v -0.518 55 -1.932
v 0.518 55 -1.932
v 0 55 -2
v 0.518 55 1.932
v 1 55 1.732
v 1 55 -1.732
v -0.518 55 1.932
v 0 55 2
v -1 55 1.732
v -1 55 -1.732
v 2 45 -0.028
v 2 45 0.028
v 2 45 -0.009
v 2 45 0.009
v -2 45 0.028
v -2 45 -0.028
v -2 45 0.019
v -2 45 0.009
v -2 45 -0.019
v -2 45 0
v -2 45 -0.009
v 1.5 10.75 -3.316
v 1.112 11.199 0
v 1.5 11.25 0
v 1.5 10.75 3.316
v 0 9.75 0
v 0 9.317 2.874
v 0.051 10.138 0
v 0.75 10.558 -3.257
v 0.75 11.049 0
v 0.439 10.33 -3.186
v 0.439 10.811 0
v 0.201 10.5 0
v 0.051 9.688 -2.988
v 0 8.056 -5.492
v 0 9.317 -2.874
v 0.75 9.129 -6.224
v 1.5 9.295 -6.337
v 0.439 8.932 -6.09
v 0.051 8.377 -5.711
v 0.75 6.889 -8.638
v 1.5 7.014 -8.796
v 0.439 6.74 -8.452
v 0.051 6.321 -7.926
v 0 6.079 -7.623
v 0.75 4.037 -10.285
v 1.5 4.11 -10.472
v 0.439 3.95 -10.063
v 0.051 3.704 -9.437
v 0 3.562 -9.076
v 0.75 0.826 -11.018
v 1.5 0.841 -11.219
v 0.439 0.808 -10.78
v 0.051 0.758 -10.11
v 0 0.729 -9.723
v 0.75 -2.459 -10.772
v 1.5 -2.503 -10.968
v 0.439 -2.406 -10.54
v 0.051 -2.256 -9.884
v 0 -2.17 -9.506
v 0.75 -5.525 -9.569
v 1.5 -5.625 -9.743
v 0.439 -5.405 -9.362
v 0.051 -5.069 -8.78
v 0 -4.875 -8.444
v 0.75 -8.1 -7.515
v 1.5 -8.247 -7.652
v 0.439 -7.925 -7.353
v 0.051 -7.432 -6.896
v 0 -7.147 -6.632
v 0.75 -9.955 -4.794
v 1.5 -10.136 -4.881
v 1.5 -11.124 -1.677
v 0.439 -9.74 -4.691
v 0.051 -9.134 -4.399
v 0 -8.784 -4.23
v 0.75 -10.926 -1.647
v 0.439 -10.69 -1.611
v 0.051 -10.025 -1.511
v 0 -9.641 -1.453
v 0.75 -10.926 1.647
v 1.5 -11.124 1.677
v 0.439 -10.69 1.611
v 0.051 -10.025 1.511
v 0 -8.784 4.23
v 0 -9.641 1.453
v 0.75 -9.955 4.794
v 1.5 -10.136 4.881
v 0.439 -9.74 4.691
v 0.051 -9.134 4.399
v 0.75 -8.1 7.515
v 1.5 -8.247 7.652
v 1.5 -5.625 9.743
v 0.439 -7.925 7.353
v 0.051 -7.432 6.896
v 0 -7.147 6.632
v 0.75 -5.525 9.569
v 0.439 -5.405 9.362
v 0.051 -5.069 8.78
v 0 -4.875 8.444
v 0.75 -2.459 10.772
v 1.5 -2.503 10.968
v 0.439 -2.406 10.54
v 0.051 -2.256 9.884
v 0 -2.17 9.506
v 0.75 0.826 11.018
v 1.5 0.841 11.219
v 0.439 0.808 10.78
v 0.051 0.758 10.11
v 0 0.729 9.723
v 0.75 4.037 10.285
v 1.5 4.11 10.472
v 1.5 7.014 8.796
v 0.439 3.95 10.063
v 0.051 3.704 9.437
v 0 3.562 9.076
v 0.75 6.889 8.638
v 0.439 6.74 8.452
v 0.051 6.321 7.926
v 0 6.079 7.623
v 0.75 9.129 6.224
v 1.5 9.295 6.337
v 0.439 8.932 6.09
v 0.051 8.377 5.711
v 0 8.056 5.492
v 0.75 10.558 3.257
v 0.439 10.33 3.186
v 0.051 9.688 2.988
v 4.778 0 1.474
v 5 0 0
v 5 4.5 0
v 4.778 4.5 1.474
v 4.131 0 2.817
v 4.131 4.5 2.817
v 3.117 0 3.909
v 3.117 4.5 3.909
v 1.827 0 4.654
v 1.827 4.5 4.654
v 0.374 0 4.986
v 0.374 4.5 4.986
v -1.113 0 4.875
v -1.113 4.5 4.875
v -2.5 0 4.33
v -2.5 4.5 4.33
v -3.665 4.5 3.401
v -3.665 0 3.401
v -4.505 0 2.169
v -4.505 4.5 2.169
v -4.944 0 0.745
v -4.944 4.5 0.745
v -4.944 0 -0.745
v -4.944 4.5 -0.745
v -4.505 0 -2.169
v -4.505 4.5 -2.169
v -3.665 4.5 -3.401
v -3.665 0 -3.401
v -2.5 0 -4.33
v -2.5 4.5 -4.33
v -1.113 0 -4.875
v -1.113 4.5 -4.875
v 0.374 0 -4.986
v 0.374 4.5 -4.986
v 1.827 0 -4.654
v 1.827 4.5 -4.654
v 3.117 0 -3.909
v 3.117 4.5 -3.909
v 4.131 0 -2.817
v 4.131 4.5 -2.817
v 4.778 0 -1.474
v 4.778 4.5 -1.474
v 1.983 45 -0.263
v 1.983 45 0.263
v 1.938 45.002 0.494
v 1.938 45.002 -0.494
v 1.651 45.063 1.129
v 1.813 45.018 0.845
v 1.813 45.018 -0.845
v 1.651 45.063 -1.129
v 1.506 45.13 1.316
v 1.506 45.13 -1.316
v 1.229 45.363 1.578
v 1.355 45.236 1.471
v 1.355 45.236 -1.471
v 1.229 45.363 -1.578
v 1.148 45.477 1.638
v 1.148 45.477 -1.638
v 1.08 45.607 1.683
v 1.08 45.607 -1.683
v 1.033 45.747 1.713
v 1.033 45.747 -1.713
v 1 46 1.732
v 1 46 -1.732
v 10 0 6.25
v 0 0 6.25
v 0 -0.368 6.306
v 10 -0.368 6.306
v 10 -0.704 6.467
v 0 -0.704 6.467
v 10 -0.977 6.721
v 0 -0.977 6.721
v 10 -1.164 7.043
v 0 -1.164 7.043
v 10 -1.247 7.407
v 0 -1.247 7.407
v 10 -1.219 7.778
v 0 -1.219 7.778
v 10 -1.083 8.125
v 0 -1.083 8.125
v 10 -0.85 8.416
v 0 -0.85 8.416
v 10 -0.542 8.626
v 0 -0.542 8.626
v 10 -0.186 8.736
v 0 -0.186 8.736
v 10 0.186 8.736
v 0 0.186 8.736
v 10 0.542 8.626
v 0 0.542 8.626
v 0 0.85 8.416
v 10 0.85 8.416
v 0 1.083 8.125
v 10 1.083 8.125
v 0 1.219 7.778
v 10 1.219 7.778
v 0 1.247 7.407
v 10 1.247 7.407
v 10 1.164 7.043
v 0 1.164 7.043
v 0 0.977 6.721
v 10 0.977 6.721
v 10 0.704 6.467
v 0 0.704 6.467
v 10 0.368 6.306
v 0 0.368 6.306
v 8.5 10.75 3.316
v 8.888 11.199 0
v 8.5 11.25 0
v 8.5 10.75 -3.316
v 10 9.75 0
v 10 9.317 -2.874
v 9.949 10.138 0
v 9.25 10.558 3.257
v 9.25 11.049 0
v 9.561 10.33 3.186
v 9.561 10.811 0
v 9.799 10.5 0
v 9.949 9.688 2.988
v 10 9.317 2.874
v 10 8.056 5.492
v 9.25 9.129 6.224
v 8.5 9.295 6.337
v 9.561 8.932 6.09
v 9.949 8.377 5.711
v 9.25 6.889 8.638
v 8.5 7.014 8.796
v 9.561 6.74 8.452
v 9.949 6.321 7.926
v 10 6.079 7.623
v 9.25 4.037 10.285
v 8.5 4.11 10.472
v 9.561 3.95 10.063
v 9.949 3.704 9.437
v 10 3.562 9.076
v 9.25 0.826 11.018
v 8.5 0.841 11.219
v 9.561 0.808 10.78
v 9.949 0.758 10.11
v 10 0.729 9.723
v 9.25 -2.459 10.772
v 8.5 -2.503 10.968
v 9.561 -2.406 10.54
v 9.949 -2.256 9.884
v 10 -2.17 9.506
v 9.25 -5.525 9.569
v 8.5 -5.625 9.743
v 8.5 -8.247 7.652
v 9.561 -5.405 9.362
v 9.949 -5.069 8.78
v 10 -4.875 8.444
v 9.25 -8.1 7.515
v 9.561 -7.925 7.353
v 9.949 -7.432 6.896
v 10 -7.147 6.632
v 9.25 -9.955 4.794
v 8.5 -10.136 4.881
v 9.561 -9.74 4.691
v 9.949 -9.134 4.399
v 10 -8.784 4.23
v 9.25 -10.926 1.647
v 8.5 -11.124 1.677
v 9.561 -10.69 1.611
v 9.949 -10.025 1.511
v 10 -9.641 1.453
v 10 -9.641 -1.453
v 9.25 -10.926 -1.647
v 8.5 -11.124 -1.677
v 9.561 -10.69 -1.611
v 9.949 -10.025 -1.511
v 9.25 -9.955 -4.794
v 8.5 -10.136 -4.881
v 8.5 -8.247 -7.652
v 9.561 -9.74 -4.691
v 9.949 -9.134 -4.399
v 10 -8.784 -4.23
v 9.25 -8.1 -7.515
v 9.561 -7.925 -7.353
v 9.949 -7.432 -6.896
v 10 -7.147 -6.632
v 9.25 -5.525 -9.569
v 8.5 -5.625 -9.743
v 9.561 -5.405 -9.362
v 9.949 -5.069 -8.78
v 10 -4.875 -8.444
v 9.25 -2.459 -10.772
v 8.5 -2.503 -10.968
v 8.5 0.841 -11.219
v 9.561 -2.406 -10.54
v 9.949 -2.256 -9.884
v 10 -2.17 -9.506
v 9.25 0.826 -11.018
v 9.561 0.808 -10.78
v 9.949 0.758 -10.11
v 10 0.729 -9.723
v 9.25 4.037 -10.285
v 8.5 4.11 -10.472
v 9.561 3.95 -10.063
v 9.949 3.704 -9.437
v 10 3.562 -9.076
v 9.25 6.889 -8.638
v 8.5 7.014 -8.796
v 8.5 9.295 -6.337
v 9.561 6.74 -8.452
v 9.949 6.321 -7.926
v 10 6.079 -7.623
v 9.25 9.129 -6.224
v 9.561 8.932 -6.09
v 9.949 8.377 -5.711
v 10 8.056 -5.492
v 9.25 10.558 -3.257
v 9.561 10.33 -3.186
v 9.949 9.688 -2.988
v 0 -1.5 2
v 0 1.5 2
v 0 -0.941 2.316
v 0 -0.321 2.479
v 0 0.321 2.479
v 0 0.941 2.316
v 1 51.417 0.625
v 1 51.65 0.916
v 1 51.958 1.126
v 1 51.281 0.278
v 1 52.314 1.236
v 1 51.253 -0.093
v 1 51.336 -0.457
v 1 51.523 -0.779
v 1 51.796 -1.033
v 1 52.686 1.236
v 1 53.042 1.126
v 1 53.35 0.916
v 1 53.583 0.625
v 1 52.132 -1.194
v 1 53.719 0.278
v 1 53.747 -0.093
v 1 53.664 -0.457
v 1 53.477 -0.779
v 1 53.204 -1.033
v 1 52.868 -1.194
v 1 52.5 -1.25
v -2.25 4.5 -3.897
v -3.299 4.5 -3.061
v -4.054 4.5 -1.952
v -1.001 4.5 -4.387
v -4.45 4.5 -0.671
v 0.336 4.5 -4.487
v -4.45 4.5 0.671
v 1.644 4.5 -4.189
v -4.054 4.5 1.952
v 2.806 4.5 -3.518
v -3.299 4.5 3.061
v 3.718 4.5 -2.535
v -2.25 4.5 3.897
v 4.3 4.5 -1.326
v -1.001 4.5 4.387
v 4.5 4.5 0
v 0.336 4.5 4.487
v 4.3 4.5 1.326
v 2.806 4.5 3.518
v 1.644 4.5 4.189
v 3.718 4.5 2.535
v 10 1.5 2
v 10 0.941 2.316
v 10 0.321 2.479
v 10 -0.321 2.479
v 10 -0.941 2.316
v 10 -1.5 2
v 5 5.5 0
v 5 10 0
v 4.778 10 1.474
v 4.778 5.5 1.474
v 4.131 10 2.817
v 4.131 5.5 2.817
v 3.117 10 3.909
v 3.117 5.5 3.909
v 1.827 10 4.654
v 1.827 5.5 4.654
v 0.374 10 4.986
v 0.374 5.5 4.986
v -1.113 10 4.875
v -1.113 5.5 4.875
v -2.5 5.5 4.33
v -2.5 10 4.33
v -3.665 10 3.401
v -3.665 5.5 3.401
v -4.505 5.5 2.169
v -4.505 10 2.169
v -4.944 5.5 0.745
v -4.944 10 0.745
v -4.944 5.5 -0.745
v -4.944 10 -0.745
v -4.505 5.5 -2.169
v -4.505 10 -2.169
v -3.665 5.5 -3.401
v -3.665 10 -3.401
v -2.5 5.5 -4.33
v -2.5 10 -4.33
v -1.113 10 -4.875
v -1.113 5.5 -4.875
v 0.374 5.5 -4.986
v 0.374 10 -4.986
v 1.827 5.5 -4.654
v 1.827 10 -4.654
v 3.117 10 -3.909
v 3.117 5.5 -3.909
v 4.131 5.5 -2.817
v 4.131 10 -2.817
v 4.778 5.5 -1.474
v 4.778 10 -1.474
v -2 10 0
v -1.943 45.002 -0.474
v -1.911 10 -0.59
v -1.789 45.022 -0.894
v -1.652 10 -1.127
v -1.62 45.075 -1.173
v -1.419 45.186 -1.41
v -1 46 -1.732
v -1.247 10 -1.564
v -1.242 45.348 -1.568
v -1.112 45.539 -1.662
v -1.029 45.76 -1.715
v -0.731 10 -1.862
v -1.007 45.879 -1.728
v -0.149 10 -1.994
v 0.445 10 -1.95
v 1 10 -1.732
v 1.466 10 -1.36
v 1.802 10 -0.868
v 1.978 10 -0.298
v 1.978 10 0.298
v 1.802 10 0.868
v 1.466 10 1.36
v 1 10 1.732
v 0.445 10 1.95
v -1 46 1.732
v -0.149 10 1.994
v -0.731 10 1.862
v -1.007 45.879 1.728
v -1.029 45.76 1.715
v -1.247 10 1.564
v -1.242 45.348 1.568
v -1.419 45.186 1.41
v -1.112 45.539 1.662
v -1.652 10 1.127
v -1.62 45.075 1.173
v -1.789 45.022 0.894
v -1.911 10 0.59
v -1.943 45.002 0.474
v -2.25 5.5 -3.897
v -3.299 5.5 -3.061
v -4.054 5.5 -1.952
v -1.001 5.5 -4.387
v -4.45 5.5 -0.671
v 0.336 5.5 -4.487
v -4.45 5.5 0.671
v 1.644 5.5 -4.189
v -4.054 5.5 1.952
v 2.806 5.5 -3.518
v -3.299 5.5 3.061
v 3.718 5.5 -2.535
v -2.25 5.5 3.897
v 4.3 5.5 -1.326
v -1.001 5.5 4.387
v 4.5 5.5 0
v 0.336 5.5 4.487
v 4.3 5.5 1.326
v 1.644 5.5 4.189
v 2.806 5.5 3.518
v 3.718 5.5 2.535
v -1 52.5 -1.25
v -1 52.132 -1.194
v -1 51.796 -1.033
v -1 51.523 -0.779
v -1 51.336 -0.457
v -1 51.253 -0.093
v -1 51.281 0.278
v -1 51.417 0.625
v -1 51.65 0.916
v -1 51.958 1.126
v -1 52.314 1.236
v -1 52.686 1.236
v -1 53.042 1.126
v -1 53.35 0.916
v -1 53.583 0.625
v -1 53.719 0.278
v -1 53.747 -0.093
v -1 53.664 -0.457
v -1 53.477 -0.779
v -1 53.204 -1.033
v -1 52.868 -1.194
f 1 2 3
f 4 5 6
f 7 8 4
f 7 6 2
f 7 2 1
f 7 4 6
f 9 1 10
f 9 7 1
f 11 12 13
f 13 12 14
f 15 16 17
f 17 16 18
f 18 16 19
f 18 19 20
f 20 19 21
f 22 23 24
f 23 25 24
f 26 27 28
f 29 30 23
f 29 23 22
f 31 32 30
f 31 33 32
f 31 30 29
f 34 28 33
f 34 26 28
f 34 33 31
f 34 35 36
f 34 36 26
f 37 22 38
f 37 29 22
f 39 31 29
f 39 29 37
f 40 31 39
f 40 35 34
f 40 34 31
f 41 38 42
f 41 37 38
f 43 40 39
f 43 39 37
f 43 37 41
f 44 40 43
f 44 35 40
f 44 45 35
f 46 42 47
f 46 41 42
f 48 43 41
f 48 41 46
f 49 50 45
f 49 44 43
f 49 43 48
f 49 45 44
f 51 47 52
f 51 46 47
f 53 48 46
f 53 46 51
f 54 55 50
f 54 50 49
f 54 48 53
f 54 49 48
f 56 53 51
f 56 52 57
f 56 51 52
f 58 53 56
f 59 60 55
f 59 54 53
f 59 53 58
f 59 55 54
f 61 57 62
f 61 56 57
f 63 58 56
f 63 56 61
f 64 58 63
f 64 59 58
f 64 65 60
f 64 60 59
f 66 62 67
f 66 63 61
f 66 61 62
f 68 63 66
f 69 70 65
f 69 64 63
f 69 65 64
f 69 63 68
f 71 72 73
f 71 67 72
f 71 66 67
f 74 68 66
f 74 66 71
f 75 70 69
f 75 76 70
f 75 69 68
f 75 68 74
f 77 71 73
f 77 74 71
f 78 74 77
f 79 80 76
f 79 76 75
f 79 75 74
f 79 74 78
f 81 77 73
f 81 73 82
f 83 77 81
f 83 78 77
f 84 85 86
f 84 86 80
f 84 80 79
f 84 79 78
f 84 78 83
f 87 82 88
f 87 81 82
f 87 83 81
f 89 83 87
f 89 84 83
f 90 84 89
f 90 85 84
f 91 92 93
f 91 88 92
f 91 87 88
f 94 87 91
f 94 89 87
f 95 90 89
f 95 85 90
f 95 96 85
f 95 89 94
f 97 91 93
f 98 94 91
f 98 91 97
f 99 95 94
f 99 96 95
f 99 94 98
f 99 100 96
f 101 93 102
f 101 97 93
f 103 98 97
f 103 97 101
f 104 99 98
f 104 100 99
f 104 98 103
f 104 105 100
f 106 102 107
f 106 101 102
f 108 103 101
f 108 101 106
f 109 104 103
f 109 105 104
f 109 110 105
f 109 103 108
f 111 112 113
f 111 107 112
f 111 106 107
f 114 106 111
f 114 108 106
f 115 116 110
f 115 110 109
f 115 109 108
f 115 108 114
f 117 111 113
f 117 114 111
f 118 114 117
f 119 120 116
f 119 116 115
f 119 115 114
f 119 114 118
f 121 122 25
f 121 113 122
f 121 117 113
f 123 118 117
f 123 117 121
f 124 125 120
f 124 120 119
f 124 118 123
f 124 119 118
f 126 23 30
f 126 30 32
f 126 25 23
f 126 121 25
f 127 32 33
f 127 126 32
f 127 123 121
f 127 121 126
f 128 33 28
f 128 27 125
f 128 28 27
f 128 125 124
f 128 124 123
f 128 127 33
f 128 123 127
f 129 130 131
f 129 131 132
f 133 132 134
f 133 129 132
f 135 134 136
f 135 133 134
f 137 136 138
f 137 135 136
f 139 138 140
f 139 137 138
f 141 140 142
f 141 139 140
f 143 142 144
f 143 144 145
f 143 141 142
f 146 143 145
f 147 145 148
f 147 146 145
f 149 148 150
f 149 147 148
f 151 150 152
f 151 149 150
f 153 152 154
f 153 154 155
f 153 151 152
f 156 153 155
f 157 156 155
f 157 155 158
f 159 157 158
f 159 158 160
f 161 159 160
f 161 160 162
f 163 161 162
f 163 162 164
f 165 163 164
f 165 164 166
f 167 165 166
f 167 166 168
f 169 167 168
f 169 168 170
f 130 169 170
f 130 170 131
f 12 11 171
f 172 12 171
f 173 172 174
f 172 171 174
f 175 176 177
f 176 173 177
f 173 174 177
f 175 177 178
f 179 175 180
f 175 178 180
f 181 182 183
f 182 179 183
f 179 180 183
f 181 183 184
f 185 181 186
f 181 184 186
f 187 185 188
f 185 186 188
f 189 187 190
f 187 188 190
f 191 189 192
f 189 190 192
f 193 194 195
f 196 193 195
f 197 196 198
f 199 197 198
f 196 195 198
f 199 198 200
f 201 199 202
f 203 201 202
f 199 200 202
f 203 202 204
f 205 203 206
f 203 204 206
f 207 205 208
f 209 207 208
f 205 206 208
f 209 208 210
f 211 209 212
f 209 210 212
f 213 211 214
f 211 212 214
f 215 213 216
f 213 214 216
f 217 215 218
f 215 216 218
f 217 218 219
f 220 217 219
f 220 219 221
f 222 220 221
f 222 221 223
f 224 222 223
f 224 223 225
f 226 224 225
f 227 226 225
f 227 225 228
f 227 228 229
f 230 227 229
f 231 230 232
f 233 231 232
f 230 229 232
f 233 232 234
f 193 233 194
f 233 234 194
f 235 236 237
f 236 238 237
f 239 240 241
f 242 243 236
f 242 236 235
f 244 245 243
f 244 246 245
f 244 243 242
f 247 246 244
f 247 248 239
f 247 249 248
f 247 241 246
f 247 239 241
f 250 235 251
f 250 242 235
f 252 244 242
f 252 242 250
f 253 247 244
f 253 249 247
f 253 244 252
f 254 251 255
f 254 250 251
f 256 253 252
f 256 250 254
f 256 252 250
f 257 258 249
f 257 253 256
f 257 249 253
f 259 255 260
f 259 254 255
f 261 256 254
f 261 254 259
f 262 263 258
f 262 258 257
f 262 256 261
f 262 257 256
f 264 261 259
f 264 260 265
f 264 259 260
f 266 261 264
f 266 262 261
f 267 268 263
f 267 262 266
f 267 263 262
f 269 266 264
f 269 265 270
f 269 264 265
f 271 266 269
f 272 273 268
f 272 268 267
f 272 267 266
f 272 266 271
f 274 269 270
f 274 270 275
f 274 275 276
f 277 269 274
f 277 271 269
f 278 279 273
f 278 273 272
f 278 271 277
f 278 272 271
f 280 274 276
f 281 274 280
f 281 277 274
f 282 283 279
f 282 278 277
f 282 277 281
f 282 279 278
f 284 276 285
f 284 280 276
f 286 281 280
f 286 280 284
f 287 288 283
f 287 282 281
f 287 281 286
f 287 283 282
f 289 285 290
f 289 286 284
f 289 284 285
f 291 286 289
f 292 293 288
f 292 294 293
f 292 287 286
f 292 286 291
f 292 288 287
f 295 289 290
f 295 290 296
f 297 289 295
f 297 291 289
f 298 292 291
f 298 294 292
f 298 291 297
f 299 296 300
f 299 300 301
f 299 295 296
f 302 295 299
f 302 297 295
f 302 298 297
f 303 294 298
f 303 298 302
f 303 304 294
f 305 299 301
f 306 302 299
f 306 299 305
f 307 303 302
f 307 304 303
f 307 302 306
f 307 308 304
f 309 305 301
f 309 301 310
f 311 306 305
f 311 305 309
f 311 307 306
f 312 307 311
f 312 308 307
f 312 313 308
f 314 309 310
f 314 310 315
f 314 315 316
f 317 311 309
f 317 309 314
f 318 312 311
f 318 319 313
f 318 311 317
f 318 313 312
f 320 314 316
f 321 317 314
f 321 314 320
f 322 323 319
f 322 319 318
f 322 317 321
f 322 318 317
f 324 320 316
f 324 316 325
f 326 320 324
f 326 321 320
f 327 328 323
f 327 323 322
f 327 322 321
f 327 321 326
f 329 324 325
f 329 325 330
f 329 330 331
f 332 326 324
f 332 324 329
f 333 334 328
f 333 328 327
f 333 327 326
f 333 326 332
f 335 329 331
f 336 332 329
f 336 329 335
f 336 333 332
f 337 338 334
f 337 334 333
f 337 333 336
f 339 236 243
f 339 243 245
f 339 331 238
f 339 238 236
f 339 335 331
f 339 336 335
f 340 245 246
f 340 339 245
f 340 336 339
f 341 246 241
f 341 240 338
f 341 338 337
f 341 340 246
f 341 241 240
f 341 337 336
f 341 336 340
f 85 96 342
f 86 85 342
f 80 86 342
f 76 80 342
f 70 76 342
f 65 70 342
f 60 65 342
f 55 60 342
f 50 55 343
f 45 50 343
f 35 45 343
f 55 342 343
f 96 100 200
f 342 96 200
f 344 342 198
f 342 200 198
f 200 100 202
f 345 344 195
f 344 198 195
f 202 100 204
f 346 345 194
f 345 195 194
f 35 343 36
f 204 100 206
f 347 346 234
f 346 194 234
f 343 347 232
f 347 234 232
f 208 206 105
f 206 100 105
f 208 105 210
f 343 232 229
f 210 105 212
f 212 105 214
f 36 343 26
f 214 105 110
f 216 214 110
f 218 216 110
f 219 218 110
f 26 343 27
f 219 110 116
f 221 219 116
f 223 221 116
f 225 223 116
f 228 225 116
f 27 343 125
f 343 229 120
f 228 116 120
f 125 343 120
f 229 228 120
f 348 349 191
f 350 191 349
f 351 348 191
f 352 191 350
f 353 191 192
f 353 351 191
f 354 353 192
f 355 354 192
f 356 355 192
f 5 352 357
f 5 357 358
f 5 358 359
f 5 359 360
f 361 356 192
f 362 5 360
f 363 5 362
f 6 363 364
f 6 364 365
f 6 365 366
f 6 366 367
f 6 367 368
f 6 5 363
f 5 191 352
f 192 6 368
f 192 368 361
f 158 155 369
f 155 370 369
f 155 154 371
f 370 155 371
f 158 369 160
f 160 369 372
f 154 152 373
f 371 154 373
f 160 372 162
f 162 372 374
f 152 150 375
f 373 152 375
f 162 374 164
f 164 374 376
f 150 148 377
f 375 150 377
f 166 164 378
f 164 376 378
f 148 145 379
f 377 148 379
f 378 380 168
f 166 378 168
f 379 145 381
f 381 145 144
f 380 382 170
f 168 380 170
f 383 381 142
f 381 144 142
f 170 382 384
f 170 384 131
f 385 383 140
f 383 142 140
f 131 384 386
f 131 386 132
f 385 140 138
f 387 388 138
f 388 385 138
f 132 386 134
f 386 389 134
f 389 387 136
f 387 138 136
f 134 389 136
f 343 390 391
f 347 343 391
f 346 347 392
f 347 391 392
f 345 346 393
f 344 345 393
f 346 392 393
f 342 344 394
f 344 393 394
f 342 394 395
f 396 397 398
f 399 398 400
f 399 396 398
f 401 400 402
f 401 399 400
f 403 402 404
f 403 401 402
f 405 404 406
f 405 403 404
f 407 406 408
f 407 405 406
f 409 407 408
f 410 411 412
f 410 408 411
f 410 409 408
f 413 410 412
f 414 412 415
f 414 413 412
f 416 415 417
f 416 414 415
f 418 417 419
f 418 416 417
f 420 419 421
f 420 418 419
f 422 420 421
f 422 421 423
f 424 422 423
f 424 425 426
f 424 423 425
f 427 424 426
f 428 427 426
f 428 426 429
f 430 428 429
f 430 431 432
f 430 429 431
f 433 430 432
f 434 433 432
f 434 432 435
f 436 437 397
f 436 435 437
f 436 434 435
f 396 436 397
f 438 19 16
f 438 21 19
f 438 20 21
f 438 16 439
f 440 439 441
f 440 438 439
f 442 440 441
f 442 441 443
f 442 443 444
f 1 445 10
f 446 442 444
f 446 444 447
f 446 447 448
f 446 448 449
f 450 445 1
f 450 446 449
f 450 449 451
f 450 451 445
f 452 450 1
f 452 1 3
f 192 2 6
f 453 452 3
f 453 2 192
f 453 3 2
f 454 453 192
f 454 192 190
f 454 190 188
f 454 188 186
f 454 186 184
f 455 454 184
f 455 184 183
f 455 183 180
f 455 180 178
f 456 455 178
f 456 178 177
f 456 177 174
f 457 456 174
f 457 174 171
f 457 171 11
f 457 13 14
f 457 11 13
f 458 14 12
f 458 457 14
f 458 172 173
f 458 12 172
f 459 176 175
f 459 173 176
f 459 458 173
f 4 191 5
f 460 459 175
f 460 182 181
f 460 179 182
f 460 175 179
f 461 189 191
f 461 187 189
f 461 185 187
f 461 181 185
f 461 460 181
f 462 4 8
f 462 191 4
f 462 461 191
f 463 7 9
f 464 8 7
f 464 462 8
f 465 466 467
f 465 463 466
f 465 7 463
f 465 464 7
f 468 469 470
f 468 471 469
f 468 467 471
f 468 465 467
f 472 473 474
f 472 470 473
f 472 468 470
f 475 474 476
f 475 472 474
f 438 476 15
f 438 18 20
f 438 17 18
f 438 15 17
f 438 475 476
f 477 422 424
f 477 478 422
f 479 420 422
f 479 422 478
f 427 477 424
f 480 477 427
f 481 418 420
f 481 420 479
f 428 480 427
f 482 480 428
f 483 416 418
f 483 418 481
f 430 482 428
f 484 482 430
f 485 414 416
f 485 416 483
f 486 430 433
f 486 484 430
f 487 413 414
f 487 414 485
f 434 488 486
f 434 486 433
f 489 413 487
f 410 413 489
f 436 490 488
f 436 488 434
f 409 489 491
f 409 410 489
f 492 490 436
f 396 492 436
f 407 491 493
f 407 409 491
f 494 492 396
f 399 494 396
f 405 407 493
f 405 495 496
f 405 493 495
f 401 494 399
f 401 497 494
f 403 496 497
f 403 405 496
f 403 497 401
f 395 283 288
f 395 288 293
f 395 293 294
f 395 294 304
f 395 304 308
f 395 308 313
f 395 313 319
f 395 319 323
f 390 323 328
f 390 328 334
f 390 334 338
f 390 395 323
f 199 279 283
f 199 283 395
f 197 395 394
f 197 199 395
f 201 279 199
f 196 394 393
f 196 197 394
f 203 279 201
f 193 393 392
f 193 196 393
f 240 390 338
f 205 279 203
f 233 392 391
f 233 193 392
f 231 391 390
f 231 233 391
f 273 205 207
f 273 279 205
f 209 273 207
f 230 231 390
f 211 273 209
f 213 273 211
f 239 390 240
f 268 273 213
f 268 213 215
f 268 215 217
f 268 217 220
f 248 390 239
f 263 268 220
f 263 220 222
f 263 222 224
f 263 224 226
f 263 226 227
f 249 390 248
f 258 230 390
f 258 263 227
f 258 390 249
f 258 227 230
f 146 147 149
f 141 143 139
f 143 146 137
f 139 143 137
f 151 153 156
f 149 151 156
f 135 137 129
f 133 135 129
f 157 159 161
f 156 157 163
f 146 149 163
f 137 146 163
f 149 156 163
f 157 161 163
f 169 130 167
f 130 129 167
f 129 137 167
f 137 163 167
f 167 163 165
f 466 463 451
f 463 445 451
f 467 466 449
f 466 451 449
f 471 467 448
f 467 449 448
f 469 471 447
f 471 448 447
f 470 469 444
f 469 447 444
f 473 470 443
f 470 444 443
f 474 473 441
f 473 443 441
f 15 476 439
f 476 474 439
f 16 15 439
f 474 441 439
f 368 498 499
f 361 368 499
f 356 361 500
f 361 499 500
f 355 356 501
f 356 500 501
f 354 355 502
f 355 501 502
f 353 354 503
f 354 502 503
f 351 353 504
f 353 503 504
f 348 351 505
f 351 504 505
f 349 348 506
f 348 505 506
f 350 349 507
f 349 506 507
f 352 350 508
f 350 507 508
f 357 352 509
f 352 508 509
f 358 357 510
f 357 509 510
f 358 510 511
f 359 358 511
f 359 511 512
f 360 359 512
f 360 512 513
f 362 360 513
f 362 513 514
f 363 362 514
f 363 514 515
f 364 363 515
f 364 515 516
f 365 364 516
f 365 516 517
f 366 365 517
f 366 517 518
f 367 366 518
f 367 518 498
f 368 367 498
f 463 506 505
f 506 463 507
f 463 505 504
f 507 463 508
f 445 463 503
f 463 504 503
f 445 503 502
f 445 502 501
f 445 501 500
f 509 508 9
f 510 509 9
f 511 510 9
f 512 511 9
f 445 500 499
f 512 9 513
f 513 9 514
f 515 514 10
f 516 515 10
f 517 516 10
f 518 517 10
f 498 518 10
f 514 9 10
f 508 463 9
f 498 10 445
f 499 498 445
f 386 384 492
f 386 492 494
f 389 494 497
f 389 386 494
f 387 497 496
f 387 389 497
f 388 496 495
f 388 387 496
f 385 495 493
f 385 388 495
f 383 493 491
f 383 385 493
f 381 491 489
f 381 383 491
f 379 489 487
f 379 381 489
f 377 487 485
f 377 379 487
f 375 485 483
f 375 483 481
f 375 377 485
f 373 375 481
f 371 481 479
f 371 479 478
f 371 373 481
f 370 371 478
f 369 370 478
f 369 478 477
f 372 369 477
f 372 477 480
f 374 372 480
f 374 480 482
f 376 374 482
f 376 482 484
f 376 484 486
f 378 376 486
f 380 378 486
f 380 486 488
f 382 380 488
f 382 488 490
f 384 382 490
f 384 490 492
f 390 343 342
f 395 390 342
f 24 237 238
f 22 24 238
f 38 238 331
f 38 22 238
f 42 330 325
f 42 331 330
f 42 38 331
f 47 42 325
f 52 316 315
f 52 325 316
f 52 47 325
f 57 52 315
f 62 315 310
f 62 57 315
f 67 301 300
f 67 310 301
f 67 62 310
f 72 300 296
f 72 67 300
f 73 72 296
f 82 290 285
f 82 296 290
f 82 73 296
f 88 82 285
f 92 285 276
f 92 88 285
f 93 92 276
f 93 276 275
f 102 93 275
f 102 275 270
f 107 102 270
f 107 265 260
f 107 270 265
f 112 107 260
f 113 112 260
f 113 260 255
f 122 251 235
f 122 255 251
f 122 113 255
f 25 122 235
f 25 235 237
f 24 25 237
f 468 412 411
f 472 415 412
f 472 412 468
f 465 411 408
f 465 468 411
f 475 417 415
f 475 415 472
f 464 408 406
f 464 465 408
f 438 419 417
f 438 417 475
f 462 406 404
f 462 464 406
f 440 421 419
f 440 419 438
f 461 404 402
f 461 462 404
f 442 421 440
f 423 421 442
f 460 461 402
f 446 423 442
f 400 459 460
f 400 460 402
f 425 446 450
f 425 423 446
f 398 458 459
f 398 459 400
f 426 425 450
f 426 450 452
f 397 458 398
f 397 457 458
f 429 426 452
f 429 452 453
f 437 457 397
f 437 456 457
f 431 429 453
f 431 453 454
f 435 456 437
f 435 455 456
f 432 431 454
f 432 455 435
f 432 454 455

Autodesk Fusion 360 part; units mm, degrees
sketch "Sketch1" plane through (0, 0, 0) normal (0, 1, 0) x (1, 0, 0)
  circle A0 centre (0, 0) radius 5
  dimension "d2" = 10
extrude "Extrude1" add sketch "Sketch1" along normal blind 10 makes body 1
sketch "Sketch2" plane through (0, 10, 0) normal (0, 1, 0) x (-1, 0, 0)
  circle A0 centre (0, 0) radius 5
  circle A1 centre (0, 0) radius 2
  dimension "d5" = 4
extrude "Extrude2" add sketch "Sketch2" along normal blind 45 contours A1 bodies 1
sketch "Sketch3" plane through (0, 0, 0) normal (0, -1, 0) x (1, 0, 0)
  circle A0 centre (0, 0) radius 5
  circle A1 centre (0, 0) radius 4.5
  dimension "d8" = -0.5
extrude "Extrude3" cut sketch "Sketch3" along normal mid plane 1 from surface at -5 bodies 1
ref_plane "WorkPlane1" through (0, 57.7618, 2) normal (0, 0, 1) x (-1, 0, 0)
sketch "Sketch9" plane through (0, 55, 0) normal (0, 1, 0) x (-1, 0, 0)
  circle A0 centre (0, 0) radius 2
  line L0 (2, -2) -> (-2, -2)
  line L1 (-2, -2) -> (-2, 2)
  line L2 (-2, 2) -> (2, 2)
  line L3 (2, 2) -> (2, -2)
  line L4 (2, -2) -> (-2, 2) construction
  line L5 (-2, -2) -> (2, 2) construction
  line L6 (0, 2) -> (-2, 2)
  line L7 (0, 2) -> (2, 2)
  line L8 (-1, 1.7321) -> (-1, -1.7321)
  line L9 (1, 1.7321) -> (1, -1.7321)
  point P0 (-1, 2)
  point P1 (1, 2)
  dimension "d148" = 4
  dimension "d149" = 4
extrude "Extrude7" cut sketch "Sketch9" against normal blind 10 contours A0 L9 | A0 L8 bodies 1
sketch "Sketch11" plane through (1, 0, 0) normal (1, 0, 0) x (0, 1, 0)
  line L0 (55, -1.7321) -> (55, 1.7321)
  line L1 (55, 1.7321) -> (45, 1.7321)
  line L2 (45, 1.7321) -> (45, -1.7321)
  line L3 (45, -1.7321) -> (55, -1.7321)
  line L4 (50, 1.7321) -> (50, -1.7321)
  line L5 (50, 0) -> (55, 0)
  point P0 (52.5, 0)
hole "Hole3" at (1, 52.5, 0) direction (-1, 0, 0) diameter 2.5 end through all bodies 1 1
fillet "Fillet2" radius 1 2 edges at (-1, 45, 0) (1, 45, 0) on bodies 1
copy_body "Body->Comp1" bodies 1 removing the originals makes body 2 in component "Piston"
sketch "Sketch1 (2)" plane through (0, 0, 0) normal (1, 0, 0) x (0, 1, 0) in component "CrankDisk"
  circle A0 centre (0, 0) radius 11.25
  dimension "d92" = 22.5
extrude "Extrude1'" add sketch "Sketch1 (2)" along normal blind 10 separate body makes body 3 in component "CrankDisk"
sketch "Sketch2 (2)" plane through (10, 0, 0) normal (1, 0, 0) x (0, 1, 0) in component "CrankDisk"
  circle A0 centre (0, 0) radius 11.25
  circle A1 centre (0, 7.5) radius 1.25
  circle A2 centre (0, 0) radius 2.5
  line L0 (1.5, 2) -> (-1.5, 2)
  circle A3 centre (0, 0) radius 3.75
  circle A4 centre (0, 0) radius 3.5
  line L1 (0, 3.75) -> (0, 11.25)
  point P0 (0, 7.5)
  dimension "d95" = 2.5
  dimension "d97" = 5
  dimension "d98" = 2
  dimension "d102" = 1
  dimension "d141" = 7.5
extrude "Extrude3'" cut sketch "Sketch2 (2)" against normal through all contours A2 L0 picked at (-0.3999, 2.0645) bodies 3 in component "CrankDisk"
hole "Hole1" at (10, 0, 7.5) direction (-1, 0, 0) diameter 2.5 end through all bodies 3 3 in component "CrankDisk"
ref_plane "WorkPlane1" through (5, 0, 0) normal (1, 0, 0) x (0, 1, 0) in component "CrankDisk"
fillet "Fillet1" radius 1.5 2 edges at (0, -10.4887, -4.0682) (10, -10.4887, -4.0682) on bodies 3 in component "CrankDisk"
component "CrankDisk" placed x (1, 0, 0) y (0, 1, 0) z (0, 0, 1) at (0, 0, 0)
component "Piston" placed x (1, 0, 0) y (0, 1, 0) z (0, 0, 1) at (0, 0, 0)
equation "Piston_Dia = 10 mm"
equation "d2 = Piston_Dia"
equation "d3 = Piston_Thickness"
equation "d6 = Piston_length"
equation "Piston_Thickness = 10 mm"
equation "d10 = ( -Piston_Thickness / 2 mm ) * 1 mm"
equation "Piston_length = 45 mm"
equation "Piston_end_Dia = 2.5 mm"
equation "Piston_end_gap = 2.5 mm"
equation "CrankDisk_Dia = 22.5 mm"
equation "CrankDiskThick = 10 mm"
equation "d92 = CrankDisk_Dia"
equation "d93 = CrankDiskThick"
equation "d95 = Piston_end_Dia"
equation "d104 = Piston_end_Dia"
equation "d156 = Piston_end_Dia"
